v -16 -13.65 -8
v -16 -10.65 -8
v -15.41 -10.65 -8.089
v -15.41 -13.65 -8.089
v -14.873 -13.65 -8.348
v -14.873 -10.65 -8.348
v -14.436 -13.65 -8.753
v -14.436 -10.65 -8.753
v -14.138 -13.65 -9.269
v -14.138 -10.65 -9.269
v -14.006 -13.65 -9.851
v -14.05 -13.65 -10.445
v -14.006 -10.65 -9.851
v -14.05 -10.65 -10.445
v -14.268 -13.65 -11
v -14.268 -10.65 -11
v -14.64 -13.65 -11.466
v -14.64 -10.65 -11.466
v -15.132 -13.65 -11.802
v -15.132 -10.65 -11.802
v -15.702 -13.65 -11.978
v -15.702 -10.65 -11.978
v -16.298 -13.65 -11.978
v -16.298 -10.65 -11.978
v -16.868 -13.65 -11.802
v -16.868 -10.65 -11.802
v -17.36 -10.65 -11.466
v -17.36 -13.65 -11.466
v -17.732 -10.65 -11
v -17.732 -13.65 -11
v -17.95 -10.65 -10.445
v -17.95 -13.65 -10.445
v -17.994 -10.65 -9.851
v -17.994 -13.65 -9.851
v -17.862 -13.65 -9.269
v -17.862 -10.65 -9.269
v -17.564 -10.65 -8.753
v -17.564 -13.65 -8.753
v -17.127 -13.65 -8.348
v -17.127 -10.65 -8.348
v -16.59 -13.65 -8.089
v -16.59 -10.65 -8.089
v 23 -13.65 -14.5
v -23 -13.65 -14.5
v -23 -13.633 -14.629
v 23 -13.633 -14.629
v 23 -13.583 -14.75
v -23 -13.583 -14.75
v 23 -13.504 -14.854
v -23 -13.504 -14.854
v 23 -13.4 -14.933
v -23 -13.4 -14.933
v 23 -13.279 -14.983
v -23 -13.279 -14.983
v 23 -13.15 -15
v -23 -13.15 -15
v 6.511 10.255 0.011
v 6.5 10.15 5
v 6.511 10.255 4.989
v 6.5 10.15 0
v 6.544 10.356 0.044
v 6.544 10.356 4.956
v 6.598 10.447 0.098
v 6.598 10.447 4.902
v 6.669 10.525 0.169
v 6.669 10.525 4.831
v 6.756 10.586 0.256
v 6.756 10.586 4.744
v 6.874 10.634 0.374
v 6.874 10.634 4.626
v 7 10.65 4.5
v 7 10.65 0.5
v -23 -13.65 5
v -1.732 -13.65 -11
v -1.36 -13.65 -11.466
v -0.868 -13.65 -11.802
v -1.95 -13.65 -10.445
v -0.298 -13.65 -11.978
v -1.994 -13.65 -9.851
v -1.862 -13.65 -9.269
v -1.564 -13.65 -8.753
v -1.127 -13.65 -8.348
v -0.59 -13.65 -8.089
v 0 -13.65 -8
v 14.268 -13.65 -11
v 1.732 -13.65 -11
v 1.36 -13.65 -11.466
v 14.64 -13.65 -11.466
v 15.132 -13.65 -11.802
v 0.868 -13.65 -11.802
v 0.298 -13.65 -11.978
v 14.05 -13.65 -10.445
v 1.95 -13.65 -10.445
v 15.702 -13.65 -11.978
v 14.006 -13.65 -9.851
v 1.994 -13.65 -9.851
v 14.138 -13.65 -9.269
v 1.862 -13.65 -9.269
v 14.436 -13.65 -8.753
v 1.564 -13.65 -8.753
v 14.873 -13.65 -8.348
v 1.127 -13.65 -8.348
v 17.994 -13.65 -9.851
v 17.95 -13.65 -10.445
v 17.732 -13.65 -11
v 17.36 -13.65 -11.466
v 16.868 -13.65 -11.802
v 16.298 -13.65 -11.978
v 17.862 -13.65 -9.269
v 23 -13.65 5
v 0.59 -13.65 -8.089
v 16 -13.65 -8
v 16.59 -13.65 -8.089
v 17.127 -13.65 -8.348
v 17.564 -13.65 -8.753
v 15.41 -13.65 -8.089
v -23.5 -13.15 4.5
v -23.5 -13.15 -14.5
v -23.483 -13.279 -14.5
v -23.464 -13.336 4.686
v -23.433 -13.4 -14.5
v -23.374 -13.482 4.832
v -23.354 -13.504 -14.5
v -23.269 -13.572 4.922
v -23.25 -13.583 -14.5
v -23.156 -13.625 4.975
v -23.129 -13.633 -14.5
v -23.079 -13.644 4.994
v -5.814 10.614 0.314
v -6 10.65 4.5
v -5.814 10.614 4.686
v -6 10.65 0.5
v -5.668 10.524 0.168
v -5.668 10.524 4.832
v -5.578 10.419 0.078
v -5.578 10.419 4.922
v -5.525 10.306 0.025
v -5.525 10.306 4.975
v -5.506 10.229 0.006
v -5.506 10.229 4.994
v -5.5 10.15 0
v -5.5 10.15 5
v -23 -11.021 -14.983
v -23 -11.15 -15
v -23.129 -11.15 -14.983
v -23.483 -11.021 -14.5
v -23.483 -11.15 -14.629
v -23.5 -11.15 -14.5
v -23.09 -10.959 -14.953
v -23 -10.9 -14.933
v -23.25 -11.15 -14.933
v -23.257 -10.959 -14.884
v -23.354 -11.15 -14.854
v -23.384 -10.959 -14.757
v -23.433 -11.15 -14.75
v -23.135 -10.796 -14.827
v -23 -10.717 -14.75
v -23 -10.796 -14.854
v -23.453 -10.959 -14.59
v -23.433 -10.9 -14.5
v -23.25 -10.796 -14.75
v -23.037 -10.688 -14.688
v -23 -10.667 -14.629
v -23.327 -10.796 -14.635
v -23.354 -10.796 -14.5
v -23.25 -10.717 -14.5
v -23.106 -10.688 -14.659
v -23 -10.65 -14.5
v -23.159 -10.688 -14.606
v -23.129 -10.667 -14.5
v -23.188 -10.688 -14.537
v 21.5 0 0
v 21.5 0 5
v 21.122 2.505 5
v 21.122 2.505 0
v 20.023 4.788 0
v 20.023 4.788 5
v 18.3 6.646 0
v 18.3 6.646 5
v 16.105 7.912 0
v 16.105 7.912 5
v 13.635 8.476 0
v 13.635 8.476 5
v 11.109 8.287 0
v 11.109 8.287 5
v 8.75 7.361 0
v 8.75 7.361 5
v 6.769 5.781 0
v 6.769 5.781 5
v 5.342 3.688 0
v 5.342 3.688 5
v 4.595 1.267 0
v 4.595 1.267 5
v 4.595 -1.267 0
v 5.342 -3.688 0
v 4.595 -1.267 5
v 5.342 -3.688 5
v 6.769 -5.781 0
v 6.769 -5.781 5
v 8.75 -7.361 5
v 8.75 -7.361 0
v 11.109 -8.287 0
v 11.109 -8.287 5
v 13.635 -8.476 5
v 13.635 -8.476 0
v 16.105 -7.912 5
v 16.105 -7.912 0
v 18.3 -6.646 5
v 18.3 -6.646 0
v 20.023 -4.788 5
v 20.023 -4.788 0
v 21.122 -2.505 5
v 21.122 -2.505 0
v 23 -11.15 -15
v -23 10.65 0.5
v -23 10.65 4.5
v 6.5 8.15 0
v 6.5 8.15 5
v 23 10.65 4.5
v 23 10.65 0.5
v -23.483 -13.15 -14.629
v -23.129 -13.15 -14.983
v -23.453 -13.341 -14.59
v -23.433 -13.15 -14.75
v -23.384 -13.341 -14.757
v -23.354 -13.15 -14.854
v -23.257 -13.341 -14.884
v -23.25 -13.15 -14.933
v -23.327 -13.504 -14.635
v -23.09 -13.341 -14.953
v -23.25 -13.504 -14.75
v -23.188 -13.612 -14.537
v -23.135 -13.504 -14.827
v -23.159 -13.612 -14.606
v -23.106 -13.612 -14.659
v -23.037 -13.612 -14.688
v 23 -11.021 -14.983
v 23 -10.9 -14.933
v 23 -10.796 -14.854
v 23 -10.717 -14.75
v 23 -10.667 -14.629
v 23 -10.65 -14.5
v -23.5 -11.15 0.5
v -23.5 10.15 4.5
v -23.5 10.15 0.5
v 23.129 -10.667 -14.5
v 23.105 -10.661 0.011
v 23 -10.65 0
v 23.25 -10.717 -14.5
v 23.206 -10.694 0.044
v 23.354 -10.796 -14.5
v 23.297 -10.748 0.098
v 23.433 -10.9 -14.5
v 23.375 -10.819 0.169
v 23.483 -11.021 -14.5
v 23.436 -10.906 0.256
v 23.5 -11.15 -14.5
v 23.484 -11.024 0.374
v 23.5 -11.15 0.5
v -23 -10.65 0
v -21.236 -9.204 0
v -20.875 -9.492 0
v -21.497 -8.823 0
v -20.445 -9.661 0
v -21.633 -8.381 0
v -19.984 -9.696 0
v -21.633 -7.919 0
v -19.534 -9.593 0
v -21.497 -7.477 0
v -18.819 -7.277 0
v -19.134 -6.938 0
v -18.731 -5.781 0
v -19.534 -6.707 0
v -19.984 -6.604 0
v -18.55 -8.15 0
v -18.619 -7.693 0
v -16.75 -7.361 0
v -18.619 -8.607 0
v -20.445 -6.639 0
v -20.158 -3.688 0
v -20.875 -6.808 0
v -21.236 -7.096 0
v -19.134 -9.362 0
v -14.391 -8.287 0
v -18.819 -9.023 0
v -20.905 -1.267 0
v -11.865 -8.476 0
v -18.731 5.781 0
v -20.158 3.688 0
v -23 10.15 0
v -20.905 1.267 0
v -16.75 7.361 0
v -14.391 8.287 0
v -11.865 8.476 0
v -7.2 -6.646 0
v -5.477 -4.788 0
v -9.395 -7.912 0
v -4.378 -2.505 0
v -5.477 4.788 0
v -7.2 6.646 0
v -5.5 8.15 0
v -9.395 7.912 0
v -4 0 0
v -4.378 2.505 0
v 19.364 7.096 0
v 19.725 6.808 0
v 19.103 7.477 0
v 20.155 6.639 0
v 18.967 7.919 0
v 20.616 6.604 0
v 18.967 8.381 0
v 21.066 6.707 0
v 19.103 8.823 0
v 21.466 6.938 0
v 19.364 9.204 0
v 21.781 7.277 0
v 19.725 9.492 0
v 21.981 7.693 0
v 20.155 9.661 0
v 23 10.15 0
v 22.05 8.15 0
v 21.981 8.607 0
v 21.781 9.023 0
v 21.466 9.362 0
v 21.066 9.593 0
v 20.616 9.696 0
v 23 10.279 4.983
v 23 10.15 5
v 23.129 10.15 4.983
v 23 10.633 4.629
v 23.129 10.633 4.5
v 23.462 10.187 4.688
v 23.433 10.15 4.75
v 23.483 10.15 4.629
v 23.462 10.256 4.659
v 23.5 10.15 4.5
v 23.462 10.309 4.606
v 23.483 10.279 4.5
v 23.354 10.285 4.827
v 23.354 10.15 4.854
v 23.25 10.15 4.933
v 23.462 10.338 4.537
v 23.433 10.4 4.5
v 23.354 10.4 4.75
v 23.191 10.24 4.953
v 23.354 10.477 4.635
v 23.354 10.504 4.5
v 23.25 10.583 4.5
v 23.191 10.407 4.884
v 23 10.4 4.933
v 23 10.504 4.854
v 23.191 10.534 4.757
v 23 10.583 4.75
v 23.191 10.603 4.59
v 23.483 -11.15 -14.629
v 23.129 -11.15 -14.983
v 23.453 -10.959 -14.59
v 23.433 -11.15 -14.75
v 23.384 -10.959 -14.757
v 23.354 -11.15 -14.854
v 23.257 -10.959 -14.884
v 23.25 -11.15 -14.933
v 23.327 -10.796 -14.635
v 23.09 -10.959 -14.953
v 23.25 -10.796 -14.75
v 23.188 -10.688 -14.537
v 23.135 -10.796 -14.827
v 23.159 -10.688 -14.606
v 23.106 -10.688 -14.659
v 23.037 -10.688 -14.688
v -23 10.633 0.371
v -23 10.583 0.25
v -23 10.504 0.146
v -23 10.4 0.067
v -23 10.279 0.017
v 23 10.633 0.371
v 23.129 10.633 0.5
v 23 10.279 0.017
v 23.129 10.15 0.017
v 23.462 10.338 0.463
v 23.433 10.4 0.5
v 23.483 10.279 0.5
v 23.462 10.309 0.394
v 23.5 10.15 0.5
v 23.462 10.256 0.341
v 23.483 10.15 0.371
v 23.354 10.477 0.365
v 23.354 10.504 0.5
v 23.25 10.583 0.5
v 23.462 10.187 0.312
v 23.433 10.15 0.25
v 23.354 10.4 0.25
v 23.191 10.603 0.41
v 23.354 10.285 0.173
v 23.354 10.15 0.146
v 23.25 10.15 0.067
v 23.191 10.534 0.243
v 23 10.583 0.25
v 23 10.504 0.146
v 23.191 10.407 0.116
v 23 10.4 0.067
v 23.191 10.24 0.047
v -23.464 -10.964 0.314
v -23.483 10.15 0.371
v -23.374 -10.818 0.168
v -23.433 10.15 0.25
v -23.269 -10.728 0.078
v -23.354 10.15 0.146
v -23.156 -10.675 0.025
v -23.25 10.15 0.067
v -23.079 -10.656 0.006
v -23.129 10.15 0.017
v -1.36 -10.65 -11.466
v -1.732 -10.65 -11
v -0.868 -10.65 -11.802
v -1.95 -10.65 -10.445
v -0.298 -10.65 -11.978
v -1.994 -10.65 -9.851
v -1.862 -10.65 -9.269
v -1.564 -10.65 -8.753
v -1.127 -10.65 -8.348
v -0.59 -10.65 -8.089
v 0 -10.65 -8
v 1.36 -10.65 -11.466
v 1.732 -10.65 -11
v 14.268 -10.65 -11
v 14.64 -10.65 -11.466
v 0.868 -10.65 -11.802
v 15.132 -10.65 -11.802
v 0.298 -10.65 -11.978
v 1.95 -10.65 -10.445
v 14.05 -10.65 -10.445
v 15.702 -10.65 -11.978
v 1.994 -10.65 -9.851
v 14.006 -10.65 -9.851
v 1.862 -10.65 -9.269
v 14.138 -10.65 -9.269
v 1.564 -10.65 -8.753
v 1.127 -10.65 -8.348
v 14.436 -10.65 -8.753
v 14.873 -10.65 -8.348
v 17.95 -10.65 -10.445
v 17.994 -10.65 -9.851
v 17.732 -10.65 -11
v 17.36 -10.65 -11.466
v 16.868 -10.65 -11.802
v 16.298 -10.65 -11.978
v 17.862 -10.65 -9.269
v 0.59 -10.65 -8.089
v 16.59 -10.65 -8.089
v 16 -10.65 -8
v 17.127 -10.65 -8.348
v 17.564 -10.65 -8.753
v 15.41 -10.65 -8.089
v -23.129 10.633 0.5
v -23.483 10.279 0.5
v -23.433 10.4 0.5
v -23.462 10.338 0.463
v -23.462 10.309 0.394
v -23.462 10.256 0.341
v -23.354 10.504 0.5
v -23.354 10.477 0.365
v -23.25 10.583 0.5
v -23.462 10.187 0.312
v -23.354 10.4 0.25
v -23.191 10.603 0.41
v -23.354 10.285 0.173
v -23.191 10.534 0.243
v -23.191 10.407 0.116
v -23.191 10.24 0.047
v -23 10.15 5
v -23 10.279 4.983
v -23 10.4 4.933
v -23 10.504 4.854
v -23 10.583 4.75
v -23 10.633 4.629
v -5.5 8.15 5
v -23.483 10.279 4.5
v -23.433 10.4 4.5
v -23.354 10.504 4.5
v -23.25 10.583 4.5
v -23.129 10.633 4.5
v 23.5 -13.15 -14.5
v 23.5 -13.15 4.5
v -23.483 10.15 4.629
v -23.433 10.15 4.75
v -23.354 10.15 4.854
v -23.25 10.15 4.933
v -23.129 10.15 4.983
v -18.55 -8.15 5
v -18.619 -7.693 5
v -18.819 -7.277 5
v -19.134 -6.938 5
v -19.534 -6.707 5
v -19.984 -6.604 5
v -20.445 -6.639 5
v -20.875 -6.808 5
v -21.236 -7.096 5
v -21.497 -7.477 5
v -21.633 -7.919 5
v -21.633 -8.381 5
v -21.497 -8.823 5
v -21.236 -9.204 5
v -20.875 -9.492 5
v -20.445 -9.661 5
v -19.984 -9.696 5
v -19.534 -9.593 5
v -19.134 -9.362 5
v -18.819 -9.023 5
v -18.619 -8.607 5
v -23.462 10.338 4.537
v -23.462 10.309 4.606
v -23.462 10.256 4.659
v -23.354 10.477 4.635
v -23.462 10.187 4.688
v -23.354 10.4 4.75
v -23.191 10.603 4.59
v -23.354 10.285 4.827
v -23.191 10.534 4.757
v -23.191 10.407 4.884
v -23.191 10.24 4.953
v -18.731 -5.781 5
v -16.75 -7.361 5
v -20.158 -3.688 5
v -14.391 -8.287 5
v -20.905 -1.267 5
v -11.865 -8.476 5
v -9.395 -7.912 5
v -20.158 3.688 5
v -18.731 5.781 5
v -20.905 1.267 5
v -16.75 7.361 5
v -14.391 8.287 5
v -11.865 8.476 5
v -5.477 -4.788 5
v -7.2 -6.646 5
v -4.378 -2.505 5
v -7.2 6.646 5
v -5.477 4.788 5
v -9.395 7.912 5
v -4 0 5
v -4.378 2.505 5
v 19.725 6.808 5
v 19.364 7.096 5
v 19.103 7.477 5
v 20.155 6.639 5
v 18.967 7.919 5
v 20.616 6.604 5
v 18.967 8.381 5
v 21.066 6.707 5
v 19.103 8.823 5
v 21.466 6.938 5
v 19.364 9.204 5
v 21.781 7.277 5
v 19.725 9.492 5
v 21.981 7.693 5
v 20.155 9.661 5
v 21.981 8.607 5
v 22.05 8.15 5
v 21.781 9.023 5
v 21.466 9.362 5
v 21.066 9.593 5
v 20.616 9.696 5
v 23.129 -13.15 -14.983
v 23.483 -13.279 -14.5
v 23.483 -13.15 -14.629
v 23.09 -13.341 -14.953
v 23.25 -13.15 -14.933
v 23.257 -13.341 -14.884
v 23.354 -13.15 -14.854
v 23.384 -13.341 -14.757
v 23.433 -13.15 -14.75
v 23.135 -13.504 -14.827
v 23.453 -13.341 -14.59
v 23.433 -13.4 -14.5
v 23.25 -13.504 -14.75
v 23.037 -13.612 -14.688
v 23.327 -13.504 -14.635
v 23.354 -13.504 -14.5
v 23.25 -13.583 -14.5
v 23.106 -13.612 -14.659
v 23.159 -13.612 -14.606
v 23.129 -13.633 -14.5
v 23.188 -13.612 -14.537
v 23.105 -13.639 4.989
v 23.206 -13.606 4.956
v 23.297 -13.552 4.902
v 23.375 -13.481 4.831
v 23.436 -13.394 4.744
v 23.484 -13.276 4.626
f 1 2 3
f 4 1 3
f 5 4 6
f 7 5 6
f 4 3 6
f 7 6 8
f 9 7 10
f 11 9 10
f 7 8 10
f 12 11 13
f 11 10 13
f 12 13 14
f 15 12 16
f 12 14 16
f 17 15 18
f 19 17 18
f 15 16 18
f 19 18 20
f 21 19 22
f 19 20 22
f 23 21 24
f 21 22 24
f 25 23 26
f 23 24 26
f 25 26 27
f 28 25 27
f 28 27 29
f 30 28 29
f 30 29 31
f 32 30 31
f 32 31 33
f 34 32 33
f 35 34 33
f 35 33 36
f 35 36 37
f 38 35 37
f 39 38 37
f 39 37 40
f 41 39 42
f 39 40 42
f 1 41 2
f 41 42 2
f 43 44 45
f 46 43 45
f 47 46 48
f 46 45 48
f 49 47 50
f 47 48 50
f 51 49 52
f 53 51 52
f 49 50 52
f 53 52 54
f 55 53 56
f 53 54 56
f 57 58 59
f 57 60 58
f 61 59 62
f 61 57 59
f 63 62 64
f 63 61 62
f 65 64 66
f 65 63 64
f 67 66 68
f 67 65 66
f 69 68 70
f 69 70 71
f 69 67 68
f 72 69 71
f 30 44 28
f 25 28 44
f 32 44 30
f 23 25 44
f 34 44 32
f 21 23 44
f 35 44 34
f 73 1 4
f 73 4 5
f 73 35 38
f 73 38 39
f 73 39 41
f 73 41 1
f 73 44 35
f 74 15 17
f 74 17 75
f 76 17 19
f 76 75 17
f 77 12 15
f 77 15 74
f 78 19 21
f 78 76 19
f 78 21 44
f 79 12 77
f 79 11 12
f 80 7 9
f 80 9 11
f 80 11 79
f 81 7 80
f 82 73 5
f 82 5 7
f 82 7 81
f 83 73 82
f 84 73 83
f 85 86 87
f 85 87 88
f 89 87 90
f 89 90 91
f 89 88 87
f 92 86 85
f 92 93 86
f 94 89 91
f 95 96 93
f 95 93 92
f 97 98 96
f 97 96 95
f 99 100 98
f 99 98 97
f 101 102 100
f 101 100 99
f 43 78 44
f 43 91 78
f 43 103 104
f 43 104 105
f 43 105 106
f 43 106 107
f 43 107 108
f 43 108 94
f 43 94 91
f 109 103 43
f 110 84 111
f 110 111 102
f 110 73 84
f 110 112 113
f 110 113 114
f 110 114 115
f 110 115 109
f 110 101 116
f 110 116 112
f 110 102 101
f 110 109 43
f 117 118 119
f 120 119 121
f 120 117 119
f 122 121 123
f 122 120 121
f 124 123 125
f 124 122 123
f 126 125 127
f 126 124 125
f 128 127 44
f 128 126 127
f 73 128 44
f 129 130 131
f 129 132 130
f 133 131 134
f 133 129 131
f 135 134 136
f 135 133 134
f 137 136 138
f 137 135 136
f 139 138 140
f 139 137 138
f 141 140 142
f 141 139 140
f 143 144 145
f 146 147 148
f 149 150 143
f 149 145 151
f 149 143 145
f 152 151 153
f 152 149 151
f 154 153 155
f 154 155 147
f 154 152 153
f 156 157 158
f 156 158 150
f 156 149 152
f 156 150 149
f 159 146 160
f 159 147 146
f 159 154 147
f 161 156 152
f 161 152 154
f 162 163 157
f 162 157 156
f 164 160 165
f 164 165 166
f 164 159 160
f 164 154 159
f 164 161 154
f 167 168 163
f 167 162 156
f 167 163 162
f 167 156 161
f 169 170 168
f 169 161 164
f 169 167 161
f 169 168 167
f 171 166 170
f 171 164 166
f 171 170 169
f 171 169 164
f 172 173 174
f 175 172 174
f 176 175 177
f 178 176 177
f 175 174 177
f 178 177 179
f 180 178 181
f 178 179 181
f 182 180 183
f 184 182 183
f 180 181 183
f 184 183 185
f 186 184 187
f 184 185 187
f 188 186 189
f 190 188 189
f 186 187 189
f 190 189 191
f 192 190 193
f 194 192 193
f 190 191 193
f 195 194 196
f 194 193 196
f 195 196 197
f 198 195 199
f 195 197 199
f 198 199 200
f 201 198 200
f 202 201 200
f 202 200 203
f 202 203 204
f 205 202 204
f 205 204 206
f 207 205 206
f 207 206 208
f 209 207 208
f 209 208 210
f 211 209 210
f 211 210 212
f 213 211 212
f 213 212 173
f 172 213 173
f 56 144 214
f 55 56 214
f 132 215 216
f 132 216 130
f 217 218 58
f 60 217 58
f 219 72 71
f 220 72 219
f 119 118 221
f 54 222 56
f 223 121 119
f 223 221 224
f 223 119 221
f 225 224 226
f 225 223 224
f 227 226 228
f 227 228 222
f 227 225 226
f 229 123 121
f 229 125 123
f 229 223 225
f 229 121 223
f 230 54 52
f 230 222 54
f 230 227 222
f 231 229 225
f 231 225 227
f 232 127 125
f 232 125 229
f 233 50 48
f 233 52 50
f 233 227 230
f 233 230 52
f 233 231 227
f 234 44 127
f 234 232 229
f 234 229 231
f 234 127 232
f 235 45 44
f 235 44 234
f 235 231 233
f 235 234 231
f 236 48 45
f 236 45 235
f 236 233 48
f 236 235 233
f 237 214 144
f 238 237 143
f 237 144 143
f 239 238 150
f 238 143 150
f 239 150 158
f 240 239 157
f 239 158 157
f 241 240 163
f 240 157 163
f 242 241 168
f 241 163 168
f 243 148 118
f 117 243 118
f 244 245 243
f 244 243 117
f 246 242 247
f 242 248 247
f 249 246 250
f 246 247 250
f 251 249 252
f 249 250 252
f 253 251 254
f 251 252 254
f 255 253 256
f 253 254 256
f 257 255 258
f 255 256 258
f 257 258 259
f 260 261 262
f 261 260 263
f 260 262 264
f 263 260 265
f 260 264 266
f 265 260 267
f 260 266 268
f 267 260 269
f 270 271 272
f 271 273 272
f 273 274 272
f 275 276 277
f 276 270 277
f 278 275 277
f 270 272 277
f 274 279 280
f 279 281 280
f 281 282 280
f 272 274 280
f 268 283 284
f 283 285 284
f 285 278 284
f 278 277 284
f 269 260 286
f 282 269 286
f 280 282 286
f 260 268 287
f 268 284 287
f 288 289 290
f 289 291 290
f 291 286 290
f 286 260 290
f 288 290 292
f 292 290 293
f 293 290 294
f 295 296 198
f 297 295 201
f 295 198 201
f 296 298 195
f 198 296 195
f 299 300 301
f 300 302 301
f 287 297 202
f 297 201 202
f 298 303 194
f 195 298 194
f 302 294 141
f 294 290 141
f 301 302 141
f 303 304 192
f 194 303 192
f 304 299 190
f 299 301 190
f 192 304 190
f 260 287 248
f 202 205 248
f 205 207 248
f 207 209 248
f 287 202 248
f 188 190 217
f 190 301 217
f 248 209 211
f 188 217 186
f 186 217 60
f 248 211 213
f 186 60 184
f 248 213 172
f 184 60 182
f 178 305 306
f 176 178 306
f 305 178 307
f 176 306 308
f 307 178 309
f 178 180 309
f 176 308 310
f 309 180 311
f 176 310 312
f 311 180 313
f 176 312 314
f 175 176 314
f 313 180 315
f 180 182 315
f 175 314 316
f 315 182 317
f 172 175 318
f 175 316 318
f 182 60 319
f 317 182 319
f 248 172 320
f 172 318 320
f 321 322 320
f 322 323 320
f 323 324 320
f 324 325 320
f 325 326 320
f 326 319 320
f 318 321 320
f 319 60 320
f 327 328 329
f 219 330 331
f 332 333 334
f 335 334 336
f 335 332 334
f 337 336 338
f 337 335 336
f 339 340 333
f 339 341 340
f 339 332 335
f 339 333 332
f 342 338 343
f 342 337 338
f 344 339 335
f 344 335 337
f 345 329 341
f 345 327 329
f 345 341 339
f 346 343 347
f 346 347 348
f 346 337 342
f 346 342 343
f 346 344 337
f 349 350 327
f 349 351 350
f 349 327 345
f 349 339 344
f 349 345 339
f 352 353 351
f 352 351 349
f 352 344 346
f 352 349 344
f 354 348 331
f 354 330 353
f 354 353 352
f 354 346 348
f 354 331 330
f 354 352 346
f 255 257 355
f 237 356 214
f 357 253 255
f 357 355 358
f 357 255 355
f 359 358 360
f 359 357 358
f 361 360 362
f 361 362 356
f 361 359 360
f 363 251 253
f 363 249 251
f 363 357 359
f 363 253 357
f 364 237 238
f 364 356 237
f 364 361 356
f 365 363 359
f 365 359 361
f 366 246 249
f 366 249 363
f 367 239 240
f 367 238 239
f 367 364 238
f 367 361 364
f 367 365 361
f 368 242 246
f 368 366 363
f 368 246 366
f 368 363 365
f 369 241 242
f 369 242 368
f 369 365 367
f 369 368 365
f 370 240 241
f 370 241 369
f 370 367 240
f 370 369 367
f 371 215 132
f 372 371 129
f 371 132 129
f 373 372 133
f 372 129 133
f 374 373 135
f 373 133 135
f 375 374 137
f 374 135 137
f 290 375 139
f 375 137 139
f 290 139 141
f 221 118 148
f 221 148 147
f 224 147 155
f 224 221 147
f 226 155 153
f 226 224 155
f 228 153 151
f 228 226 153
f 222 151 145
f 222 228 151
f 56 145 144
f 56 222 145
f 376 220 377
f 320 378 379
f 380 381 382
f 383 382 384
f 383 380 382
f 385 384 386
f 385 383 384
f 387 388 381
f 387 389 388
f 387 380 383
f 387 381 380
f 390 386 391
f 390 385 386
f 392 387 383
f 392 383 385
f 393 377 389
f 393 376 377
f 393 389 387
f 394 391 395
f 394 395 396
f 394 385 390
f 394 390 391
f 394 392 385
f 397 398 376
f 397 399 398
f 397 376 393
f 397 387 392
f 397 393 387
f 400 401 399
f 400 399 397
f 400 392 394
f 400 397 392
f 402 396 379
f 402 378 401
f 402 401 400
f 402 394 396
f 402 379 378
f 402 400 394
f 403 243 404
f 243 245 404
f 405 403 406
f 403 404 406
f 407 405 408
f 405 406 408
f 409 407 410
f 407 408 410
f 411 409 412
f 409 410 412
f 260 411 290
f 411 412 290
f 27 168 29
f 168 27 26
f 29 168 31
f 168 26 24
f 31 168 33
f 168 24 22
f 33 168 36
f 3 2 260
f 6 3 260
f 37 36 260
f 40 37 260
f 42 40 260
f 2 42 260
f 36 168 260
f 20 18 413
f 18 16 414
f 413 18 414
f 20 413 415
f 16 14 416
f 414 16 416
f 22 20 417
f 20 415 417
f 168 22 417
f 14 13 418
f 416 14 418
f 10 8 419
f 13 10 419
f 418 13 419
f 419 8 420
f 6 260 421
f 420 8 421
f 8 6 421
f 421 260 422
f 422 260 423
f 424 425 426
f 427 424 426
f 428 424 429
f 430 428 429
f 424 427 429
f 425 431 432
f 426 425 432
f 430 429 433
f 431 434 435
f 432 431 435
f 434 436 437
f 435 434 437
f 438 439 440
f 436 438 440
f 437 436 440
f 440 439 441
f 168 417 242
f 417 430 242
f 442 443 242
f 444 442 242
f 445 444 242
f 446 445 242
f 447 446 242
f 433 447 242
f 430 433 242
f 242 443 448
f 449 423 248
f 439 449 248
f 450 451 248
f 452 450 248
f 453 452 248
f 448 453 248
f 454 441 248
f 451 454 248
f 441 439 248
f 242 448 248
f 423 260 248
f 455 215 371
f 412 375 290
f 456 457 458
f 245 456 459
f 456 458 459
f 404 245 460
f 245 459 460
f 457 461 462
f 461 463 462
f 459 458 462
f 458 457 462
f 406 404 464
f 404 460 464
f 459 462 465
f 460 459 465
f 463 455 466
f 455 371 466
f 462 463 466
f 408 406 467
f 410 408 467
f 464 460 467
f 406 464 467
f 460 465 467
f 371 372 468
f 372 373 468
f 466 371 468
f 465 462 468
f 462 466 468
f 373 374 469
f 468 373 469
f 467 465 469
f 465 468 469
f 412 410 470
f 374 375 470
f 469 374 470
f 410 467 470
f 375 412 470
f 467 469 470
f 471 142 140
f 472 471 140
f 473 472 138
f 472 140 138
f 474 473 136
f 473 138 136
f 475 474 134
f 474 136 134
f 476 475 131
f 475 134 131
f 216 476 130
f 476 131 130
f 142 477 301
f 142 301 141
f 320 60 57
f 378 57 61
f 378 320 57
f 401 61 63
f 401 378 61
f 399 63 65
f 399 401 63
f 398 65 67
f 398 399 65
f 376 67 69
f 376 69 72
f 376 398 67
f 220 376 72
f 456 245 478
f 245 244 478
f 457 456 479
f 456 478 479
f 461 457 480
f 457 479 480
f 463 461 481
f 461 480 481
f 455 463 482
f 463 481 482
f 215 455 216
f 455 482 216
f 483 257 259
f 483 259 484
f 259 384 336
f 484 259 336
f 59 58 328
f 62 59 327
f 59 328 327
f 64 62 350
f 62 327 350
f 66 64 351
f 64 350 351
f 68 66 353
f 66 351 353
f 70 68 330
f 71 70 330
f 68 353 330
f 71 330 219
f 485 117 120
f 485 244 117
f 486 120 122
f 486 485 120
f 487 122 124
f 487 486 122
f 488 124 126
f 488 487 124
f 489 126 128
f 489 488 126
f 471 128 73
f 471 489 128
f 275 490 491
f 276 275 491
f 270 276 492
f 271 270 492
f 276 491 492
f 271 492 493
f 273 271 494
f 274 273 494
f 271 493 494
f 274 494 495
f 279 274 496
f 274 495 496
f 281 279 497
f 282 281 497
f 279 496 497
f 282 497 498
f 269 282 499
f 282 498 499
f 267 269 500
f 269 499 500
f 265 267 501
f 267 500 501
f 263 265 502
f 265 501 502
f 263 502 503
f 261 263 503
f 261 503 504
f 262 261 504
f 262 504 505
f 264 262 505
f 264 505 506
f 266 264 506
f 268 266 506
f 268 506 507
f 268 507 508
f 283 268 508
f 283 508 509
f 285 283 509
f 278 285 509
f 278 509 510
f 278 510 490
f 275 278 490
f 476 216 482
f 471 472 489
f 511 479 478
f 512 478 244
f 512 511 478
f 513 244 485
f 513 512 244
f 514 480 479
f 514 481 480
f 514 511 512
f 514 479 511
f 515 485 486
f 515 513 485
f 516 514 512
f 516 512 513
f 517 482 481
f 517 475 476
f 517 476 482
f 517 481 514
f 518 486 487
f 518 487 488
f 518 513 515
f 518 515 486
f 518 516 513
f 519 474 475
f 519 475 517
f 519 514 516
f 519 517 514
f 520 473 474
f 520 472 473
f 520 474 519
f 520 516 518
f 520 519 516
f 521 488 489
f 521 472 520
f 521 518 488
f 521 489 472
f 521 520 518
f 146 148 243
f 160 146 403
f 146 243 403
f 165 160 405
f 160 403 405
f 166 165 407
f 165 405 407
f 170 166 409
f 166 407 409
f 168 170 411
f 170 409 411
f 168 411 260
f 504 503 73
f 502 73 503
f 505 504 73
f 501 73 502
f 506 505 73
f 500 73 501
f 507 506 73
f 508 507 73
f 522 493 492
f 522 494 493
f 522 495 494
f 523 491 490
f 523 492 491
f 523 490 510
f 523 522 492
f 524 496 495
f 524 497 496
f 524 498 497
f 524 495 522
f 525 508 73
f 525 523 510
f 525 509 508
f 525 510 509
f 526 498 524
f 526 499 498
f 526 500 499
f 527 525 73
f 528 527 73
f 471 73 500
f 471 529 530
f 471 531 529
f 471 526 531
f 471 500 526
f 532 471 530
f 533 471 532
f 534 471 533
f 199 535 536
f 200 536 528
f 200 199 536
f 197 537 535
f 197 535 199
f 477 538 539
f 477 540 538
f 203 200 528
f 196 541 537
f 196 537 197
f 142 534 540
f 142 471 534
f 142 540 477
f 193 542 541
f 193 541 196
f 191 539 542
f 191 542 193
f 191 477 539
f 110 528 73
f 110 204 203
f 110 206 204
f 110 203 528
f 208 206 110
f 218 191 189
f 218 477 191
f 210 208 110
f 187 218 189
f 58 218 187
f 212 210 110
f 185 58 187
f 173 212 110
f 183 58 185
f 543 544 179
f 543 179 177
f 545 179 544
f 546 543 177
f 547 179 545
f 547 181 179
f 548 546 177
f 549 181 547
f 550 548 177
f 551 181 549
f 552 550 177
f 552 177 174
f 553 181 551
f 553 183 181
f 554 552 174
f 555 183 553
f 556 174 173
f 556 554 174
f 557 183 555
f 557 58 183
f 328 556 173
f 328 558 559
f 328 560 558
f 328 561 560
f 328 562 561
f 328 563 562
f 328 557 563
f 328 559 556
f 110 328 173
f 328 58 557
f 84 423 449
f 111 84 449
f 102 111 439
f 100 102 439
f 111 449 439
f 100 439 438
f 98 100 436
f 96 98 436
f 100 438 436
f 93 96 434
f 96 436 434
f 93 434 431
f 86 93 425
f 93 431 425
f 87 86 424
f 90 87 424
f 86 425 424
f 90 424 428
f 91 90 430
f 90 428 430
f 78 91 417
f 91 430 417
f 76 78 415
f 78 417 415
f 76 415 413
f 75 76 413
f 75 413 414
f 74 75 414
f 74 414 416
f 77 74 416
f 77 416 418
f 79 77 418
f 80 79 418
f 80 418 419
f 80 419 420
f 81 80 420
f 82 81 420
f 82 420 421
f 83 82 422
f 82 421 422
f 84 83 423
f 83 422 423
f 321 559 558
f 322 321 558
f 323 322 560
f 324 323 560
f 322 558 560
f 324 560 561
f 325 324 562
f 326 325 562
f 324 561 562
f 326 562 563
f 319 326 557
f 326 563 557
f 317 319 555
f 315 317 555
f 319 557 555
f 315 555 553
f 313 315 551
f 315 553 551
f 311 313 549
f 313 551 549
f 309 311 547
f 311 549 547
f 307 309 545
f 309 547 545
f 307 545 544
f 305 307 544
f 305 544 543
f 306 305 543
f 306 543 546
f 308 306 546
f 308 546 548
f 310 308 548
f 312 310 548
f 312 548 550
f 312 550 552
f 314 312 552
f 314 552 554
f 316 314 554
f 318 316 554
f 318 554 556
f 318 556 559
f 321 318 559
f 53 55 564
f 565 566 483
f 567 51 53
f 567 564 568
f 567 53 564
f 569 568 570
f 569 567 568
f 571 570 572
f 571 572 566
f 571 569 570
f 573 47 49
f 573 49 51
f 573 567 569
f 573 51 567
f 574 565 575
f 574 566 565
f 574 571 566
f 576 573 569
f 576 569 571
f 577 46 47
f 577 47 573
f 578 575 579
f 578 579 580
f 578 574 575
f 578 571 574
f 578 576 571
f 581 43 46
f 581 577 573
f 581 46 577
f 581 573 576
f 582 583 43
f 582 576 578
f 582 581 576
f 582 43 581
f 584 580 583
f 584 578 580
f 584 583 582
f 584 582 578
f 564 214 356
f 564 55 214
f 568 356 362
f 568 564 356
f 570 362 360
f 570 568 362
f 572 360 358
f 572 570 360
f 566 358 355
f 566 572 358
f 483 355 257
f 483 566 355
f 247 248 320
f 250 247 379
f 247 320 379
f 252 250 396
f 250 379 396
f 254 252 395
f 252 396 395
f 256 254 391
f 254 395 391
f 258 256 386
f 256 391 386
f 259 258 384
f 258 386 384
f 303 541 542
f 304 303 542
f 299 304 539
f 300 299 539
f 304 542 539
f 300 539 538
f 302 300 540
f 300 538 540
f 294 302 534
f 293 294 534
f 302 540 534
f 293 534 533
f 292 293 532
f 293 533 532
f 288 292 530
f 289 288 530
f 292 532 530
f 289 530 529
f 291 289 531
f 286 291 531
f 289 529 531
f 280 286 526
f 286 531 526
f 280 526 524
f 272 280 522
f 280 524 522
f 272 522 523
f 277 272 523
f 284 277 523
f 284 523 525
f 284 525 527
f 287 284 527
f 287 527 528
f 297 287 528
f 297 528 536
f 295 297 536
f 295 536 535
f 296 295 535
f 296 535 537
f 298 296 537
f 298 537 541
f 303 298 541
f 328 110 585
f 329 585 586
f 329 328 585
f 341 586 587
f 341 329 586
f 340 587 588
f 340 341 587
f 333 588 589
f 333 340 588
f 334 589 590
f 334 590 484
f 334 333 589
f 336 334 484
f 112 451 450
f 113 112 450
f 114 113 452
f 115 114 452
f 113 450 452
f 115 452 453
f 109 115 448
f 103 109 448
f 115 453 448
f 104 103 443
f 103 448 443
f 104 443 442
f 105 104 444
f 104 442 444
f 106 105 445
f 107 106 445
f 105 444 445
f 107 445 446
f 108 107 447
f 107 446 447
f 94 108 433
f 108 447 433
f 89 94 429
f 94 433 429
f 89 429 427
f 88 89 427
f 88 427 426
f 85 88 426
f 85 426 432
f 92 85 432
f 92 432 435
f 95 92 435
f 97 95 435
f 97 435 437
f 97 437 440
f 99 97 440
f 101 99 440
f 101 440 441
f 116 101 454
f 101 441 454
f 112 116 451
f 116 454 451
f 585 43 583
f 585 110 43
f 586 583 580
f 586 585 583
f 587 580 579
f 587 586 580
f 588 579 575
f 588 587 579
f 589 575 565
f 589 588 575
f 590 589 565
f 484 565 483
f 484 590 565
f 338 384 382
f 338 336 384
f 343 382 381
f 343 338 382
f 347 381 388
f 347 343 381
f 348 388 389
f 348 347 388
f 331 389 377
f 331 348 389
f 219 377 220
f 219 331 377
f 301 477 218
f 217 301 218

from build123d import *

# Parameters (mm, degrees)
SKETCH_1_W          = 47
SKETCH_1_H          = 21.3
EXTRUDE_1_DEPTH     = 5
SKETCH_2_R          = 1.55
SKETCH_2_R_2        = 8.5
CUT_EXTRUDE_1_DEPTH = 13.95
SKETCH_7_W          = 47
SKETCH_7_H          = 20
EXTRUDE_3_DEPTH     = 3
SKETCH_3_W          = 12
SKETCH_3_H          = 2.5
CUT_EXTRUDE_2_DEPTH = 13.95
FILLET_4_R          = 0.5
SKETCH_11_R         = 2
CUT_EXTRUDE_4_DEPTH = 3
FILLET_5_R          = 0.5


with BuildPart() as part:
    # 草圖1 → 填料-伸長1 (new body)
    with BuildSketch(Plane.XY):
        Rectangle(SKETCH_1_W, SKETCH_1_H)
    extrude(amount=EXTRUDE_1_DEPTH)

    # 草圖2 → 除料-伸長1 (cut)
    with BuildSketch(Plane.XY.offset(5)):
        with Locations((-20.1, -8.15)):
            Circle(SKETCH_2_R)
        with Locations((20.5, 8.15)):
            Circle(SKETCH_2_R)
        with Locations((-12.5, 0)):
            Circle(SKETCH_2_R_2)
        with Locations((13, 0)):
            Circle(SKETCH_2_R_2)
    extrude(amount=-CUT_EXTRUDE_1_DEPTH, mode=Mode.SUBTRACT)

    # 草圖7 → 填料-伸長3 (add)
    with BuildSketch(Plane.XZ.offset(10.65)):
        with Locations((0, -5)):
            Rectangle(SKETCH_7_W, SKETCH_7_H)
    extrude(amount=EXTRUDE_3_DEPTH)

    # 草圖3 → 除料-伸長2 (cut)
    with BuildSketch(Plane.XY.offset(5)):
        with Locations((0.5, 9.4)):
            Rectangle(SKETCH_3_W, SKETCH_3_H)
    extrude(amount=-CUT_EXTRUDE_2_DEPTH, mode=Mode.SUBTRACT)

    # 圓角4
    fillet_4_edges = [part.edges().sort_by_distance(p)[0] for p in [
        (15, 10.65, 5),
        (6.5, 10.65, 2.5),
        (15, 10.65, 0),
        (-14.5, 10.65, 0),
        (-5.5, 10.65, 2.5),
        (-14.5, 10.65, 5),
        (-23.5, 10.65, 2.5),
        (-23.5, -1.5, 5),
        (-23.5, -13.65, -5),
        (-23.5, -12.15, -15),
        (-23.5, -10.65, -7.5),
        (-23.5, 0, 0),
        (23.5, -10.65, -7.5),
        (23.5, -12.15, -15),
        (23.5, -13.65, -5),
        (23.5, -1.5, 5),
        (23.5, 10.65, 2.5),
        (23.5, 0, 0),
    ]]
    fillet(fillet_4_edges, radius=FILLET_4_R)

    # 草圖11 → 除料-伸長4 (cut)
    with BuildSketch(Plane(origin=(0, -10.65, 0), x_dir=(1, 0, 0), z_dir=(0, 1, 0))):
        with Locations(Location((0, 10, 0), (0, 0, 270))):
            Circle(SKETCH_11_R)
        with Locations(Location((16, 10, 0), (0, 0, 270))):
            Circle(SKETCH_11_R)
        with Locations(Location((-16, 10, 0), (0, 0, 270))):
            Circle(SKETCH_11_R)
    extrude(amount=-CUT_EXTRUDE_4_DEPTH, mode=Mode.SUBTRACT)

    # 圓角5
    # the kernel refuses this fillet: 0.5 mm, written as the material it takes off along each edge
    with BuildSketch(Plane(origin=(-23, -13.15, -14.5), x_dir=(0, 0, -1), z_dir=(0, -1, 0))) as fillet_5_piece_1_section:
        Polygon((0, 0), (FILLET_5_R, 0), (FILLET_5_R, -FILLET_5_R), (0, -FILLET_5_R), align=None)
    fillet_5_piece_1 = extrude(amount=FILLET_5_R, mode=Mode.PRIVATE)
    fillet_5_piece_1 = fillet_5_piece_1 - Plane(origin=(-23, -13.15, -14.5), x_dir=(0.7071067811865475, 0, 0.7071067811865475), z_dir=(0, -1, 0)) * Sphere(FILLET_5_R, mode=Mode.PRIVATE)
    add(fillet_5_piece_1, mode=Mode.SUBTRACT)
    with BuildSketch(Plane(origin=(-23, -11.15, -14.5), x_dir=(0, 0, -1), z_dir=(0, 1, 0))) as fillet_5_piece_2_section:
        Polygon((0, 0), (FILLET_5_R, 0), (FILLET_5_R, FILLET_5_R), (0, FILLET_5_R), align=None)
    fillet_5_piece_2 = extrude(amount=FILLET_5_R, mode=Mode.PRIVATE)
    fillet_5_piece_2 = fillet_5_piece_2 - Plane(origin=(-23, -11.15, -14.5), x_dir=(0.7071067811865475, 0, 0.7071067811865475), z_dir=(0, 1, 0)) * Sphere(FILLET_5_R, mode=Mode.PRIVATE)
    add(fillet_5_piece_2, mode=Mode.SUBTRACT)
    with BuildSketch(Plane(origin=(23, -11.15, -14.5), x_dir=(0, 0, -1), z_dir=(0, 1, 0))) as fillet_5_piece_3_section:
        Polygon((0, 0), (FILLET_5_R, 0), (FILLET_5_R, -FILLET_5_R), (0, -FILLET_5_R), align=None)
    fillet_5_piece_3 = extrude(amount=FILLET_5_R, mode=Mode.PRIVATE)
    fillet_5_piece_3 = fillet_5_piece_3 - Plane(origin=(23, -11.15, -14.5), x_dir=(-0.7071067811865475, 0, 0.7071067811865475), z_dir=(0, 1, 0)) * Sphere(FILLET_5_R, mode=Mode.PRIVATE)
    add(fillet_5_piece_3, mode=Mode.SUBTRACT)
    with BuildSketch(Plane(origin=(23, -13.15, -14.5), x_dir=(0, 0, -1), z_dir=(0, -1, 0))) as fillet_5_piece_4_section:
        Polygon((0, 0), (FILLET_5_R, 0), (FILLET_5_R, FILLET_5_R), (0, FILLET_5_R), align=None)
    fillet_5_piece_4 = extrude(amount=FILLET_5_R, mode=Mode.PRIVATE)
    fillet_5_piece_4 = fillet_5_piece_4 - Plane(origin=(23, -13.15, -14.5), x_dir=(-0.7071067811865475, 0, 0.7071067811865475), z_dir=(0, -1, 0)) * Sphere(FILLET_5_R, mode=Mode.PRIVATE)
    add(fillet_5_piece_4, mode=Mode.SUBTRACT)
    with BuildSketch(Plane(origin=(-23, -13.65, -15), x_dir=(0, 0, 1), z_dir=(1, 0, 0))) as fillet_5_piece_5:
        with BuildLine():
            CenterArc((FILLET_5_R, -FILLET_5_R), FILLET_5_R, 90, 90)
            Line((0, -FILLET_5_R), (0, 0))
            Line((0, 0), (FILLET_5_R, 0))
        make_face()
    extrude(amount=46, mode=Mode.SUBTRACT)
    with BuildSketch(Plane(origin=(-23, -10.65, -15), x_dir=(0, 0, 1), z_dir=(1, 0, 0))) as fillet_5_piece_6:
        with BuildLine():
            CenterArc((FILLET_5_R, FILLET_5_R), FILLET_5_R, 180, 90)
            Line((0, FILLET_5_R), (0, 0))
            Line((0, 0), (FILLET_5_R, 0))
        make_face()
    extrude(amount=46, mode=Mode.SUBTRACT)


solid = part.part
